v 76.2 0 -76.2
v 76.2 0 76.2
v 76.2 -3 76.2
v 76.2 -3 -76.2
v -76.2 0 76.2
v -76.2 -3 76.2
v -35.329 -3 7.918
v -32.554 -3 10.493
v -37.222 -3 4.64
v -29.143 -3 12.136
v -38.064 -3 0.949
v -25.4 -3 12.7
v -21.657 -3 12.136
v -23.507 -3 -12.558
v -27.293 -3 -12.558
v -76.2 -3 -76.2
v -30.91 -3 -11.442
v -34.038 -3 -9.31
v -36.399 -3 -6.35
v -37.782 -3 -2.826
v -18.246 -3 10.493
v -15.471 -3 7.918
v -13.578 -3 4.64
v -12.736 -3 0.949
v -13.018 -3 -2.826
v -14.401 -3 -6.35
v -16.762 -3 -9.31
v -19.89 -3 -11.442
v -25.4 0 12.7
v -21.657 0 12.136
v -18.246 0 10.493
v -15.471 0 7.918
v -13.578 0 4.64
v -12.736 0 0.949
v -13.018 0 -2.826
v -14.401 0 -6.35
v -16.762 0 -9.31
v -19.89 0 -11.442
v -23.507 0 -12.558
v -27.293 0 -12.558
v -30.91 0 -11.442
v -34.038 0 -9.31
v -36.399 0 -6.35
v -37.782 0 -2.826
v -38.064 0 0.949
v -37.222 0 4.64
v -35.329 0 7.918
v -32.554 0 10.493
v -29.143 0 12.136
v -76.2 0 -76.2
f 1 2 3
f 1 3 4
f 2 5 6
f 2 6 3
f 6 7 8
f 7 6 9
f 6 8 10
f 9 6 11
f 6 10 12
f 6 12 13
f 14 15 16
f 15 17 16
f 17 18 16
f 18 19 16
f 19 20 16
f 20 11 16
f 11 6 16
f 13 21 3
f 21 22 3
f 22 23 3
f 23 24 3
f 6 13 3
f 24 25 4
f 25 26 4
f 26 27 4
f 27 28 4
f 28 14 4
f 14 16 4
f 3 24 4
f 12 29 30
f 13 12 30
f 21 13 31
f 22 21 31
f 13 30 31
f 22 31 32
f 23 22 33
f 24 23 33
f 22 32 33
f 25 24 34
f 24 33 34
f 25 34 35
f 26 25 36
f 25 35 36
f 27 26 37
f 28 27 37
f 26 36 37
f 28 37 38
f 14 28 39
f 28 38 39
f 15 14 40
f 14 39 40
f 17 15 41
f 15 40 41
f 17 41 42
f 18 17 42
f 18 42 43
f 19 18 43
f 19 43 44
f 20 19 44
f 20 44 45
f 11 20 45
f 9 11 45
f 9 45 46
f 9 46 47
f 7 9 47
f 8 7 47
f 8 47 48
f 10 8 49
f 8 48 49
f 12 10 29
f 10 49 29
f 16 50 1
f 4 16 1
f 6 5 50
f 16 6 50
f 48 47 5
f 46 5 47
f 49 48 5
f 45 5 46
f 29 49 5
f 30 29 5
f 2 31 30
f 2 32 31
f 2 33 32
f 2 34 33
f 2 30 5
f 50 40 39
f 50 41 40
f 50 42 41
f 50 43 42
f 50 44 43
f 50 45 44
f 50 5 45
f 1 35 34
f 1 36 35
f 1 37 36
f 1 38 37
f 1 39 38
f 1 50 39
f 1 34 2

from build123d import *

# Parameters (mm, degrees)
SKETCH1_W           = 152.4
SKETCH1_H           = 152.4
SKETCH1_R           = 5
SKETCH1_R_2         = 12.7
BOSS_EXTRUDE1_DEPTH = 3


with BuildPart() as part:
    # Sketch1 → Boss-Extrude1 (new body)
    # profile 1 of 5: a face of its own
    with BuildSketch(Plane(origin=(0, 0, 0), x_dir=(1, 0, 0), z_dir=(0, 1, 0))):
        Rectangle(SKETCH1_W, SKETCH1_H)
        with Locations((57.513684792, -57.513684792)):
            Circle(SKETCH1_R, mode=Mode.SUBTRACT)
        with Locations((57.513684792, 57.513684792)):
            Circle(SKETCH1_R, mode=Mode.SUBTRACT)
        with Locations((-57.513684792, 57.513684792)):
            Circle(SKETCH1_R, mode=Mode.SUBTRACT)
        with Locations((-57.513684792, -57.513684792)):
            Circle(SKETCH1_R, mode=Mode.SUBTRACT)
        with Locations(Location((-25.4, 0, 0), (0, 0, 270))):
            Circle(SKETCH1_R_2, mode=Mode.SUBTRACT)
    # profile 2 of 5: a face of its own
    with BuildSketch(Plane(origin=(0, 0, 0), x_dir=(1, 0, 0), z_dir=(0, 1, 0))):
        with Locations((57.513684792, -57.513684792)):
            Circle(SKETCH1_R)
    # profile 3 of 5: a face of its own
    with BuildSketch(Plane(origin=(0, 0, 0), x_dir=(1, 0, 0), z_dir=(0, 1, 0))):
        with Locations((-57.513684792, -57.513684792)):
            Circle(SKETCH1_R)
    # profile 4 of 5: a face of its own
    with BuildSketch(Plane(origin=(0, 0, 0), x_dir=(1, 0, 0), z_dir=(0, 1, 0))):
        with Locations((57.513684792, 57.513684792)):
            Circle(SKETCH1_R)
    # profile 5 of 5: a face of its own
    with BuildSketch(Plane(origin=(0, 0, 0), x_dir=(1, 0, 0), z_dir=(0, 1, 0))):
        with Locations((-57.513684792, 57.513684792)):
            Circle(SKETCH1_R)
    extrude(amount=-BOSS_EXTRUDE1_DEPTH)


solid = part.part
